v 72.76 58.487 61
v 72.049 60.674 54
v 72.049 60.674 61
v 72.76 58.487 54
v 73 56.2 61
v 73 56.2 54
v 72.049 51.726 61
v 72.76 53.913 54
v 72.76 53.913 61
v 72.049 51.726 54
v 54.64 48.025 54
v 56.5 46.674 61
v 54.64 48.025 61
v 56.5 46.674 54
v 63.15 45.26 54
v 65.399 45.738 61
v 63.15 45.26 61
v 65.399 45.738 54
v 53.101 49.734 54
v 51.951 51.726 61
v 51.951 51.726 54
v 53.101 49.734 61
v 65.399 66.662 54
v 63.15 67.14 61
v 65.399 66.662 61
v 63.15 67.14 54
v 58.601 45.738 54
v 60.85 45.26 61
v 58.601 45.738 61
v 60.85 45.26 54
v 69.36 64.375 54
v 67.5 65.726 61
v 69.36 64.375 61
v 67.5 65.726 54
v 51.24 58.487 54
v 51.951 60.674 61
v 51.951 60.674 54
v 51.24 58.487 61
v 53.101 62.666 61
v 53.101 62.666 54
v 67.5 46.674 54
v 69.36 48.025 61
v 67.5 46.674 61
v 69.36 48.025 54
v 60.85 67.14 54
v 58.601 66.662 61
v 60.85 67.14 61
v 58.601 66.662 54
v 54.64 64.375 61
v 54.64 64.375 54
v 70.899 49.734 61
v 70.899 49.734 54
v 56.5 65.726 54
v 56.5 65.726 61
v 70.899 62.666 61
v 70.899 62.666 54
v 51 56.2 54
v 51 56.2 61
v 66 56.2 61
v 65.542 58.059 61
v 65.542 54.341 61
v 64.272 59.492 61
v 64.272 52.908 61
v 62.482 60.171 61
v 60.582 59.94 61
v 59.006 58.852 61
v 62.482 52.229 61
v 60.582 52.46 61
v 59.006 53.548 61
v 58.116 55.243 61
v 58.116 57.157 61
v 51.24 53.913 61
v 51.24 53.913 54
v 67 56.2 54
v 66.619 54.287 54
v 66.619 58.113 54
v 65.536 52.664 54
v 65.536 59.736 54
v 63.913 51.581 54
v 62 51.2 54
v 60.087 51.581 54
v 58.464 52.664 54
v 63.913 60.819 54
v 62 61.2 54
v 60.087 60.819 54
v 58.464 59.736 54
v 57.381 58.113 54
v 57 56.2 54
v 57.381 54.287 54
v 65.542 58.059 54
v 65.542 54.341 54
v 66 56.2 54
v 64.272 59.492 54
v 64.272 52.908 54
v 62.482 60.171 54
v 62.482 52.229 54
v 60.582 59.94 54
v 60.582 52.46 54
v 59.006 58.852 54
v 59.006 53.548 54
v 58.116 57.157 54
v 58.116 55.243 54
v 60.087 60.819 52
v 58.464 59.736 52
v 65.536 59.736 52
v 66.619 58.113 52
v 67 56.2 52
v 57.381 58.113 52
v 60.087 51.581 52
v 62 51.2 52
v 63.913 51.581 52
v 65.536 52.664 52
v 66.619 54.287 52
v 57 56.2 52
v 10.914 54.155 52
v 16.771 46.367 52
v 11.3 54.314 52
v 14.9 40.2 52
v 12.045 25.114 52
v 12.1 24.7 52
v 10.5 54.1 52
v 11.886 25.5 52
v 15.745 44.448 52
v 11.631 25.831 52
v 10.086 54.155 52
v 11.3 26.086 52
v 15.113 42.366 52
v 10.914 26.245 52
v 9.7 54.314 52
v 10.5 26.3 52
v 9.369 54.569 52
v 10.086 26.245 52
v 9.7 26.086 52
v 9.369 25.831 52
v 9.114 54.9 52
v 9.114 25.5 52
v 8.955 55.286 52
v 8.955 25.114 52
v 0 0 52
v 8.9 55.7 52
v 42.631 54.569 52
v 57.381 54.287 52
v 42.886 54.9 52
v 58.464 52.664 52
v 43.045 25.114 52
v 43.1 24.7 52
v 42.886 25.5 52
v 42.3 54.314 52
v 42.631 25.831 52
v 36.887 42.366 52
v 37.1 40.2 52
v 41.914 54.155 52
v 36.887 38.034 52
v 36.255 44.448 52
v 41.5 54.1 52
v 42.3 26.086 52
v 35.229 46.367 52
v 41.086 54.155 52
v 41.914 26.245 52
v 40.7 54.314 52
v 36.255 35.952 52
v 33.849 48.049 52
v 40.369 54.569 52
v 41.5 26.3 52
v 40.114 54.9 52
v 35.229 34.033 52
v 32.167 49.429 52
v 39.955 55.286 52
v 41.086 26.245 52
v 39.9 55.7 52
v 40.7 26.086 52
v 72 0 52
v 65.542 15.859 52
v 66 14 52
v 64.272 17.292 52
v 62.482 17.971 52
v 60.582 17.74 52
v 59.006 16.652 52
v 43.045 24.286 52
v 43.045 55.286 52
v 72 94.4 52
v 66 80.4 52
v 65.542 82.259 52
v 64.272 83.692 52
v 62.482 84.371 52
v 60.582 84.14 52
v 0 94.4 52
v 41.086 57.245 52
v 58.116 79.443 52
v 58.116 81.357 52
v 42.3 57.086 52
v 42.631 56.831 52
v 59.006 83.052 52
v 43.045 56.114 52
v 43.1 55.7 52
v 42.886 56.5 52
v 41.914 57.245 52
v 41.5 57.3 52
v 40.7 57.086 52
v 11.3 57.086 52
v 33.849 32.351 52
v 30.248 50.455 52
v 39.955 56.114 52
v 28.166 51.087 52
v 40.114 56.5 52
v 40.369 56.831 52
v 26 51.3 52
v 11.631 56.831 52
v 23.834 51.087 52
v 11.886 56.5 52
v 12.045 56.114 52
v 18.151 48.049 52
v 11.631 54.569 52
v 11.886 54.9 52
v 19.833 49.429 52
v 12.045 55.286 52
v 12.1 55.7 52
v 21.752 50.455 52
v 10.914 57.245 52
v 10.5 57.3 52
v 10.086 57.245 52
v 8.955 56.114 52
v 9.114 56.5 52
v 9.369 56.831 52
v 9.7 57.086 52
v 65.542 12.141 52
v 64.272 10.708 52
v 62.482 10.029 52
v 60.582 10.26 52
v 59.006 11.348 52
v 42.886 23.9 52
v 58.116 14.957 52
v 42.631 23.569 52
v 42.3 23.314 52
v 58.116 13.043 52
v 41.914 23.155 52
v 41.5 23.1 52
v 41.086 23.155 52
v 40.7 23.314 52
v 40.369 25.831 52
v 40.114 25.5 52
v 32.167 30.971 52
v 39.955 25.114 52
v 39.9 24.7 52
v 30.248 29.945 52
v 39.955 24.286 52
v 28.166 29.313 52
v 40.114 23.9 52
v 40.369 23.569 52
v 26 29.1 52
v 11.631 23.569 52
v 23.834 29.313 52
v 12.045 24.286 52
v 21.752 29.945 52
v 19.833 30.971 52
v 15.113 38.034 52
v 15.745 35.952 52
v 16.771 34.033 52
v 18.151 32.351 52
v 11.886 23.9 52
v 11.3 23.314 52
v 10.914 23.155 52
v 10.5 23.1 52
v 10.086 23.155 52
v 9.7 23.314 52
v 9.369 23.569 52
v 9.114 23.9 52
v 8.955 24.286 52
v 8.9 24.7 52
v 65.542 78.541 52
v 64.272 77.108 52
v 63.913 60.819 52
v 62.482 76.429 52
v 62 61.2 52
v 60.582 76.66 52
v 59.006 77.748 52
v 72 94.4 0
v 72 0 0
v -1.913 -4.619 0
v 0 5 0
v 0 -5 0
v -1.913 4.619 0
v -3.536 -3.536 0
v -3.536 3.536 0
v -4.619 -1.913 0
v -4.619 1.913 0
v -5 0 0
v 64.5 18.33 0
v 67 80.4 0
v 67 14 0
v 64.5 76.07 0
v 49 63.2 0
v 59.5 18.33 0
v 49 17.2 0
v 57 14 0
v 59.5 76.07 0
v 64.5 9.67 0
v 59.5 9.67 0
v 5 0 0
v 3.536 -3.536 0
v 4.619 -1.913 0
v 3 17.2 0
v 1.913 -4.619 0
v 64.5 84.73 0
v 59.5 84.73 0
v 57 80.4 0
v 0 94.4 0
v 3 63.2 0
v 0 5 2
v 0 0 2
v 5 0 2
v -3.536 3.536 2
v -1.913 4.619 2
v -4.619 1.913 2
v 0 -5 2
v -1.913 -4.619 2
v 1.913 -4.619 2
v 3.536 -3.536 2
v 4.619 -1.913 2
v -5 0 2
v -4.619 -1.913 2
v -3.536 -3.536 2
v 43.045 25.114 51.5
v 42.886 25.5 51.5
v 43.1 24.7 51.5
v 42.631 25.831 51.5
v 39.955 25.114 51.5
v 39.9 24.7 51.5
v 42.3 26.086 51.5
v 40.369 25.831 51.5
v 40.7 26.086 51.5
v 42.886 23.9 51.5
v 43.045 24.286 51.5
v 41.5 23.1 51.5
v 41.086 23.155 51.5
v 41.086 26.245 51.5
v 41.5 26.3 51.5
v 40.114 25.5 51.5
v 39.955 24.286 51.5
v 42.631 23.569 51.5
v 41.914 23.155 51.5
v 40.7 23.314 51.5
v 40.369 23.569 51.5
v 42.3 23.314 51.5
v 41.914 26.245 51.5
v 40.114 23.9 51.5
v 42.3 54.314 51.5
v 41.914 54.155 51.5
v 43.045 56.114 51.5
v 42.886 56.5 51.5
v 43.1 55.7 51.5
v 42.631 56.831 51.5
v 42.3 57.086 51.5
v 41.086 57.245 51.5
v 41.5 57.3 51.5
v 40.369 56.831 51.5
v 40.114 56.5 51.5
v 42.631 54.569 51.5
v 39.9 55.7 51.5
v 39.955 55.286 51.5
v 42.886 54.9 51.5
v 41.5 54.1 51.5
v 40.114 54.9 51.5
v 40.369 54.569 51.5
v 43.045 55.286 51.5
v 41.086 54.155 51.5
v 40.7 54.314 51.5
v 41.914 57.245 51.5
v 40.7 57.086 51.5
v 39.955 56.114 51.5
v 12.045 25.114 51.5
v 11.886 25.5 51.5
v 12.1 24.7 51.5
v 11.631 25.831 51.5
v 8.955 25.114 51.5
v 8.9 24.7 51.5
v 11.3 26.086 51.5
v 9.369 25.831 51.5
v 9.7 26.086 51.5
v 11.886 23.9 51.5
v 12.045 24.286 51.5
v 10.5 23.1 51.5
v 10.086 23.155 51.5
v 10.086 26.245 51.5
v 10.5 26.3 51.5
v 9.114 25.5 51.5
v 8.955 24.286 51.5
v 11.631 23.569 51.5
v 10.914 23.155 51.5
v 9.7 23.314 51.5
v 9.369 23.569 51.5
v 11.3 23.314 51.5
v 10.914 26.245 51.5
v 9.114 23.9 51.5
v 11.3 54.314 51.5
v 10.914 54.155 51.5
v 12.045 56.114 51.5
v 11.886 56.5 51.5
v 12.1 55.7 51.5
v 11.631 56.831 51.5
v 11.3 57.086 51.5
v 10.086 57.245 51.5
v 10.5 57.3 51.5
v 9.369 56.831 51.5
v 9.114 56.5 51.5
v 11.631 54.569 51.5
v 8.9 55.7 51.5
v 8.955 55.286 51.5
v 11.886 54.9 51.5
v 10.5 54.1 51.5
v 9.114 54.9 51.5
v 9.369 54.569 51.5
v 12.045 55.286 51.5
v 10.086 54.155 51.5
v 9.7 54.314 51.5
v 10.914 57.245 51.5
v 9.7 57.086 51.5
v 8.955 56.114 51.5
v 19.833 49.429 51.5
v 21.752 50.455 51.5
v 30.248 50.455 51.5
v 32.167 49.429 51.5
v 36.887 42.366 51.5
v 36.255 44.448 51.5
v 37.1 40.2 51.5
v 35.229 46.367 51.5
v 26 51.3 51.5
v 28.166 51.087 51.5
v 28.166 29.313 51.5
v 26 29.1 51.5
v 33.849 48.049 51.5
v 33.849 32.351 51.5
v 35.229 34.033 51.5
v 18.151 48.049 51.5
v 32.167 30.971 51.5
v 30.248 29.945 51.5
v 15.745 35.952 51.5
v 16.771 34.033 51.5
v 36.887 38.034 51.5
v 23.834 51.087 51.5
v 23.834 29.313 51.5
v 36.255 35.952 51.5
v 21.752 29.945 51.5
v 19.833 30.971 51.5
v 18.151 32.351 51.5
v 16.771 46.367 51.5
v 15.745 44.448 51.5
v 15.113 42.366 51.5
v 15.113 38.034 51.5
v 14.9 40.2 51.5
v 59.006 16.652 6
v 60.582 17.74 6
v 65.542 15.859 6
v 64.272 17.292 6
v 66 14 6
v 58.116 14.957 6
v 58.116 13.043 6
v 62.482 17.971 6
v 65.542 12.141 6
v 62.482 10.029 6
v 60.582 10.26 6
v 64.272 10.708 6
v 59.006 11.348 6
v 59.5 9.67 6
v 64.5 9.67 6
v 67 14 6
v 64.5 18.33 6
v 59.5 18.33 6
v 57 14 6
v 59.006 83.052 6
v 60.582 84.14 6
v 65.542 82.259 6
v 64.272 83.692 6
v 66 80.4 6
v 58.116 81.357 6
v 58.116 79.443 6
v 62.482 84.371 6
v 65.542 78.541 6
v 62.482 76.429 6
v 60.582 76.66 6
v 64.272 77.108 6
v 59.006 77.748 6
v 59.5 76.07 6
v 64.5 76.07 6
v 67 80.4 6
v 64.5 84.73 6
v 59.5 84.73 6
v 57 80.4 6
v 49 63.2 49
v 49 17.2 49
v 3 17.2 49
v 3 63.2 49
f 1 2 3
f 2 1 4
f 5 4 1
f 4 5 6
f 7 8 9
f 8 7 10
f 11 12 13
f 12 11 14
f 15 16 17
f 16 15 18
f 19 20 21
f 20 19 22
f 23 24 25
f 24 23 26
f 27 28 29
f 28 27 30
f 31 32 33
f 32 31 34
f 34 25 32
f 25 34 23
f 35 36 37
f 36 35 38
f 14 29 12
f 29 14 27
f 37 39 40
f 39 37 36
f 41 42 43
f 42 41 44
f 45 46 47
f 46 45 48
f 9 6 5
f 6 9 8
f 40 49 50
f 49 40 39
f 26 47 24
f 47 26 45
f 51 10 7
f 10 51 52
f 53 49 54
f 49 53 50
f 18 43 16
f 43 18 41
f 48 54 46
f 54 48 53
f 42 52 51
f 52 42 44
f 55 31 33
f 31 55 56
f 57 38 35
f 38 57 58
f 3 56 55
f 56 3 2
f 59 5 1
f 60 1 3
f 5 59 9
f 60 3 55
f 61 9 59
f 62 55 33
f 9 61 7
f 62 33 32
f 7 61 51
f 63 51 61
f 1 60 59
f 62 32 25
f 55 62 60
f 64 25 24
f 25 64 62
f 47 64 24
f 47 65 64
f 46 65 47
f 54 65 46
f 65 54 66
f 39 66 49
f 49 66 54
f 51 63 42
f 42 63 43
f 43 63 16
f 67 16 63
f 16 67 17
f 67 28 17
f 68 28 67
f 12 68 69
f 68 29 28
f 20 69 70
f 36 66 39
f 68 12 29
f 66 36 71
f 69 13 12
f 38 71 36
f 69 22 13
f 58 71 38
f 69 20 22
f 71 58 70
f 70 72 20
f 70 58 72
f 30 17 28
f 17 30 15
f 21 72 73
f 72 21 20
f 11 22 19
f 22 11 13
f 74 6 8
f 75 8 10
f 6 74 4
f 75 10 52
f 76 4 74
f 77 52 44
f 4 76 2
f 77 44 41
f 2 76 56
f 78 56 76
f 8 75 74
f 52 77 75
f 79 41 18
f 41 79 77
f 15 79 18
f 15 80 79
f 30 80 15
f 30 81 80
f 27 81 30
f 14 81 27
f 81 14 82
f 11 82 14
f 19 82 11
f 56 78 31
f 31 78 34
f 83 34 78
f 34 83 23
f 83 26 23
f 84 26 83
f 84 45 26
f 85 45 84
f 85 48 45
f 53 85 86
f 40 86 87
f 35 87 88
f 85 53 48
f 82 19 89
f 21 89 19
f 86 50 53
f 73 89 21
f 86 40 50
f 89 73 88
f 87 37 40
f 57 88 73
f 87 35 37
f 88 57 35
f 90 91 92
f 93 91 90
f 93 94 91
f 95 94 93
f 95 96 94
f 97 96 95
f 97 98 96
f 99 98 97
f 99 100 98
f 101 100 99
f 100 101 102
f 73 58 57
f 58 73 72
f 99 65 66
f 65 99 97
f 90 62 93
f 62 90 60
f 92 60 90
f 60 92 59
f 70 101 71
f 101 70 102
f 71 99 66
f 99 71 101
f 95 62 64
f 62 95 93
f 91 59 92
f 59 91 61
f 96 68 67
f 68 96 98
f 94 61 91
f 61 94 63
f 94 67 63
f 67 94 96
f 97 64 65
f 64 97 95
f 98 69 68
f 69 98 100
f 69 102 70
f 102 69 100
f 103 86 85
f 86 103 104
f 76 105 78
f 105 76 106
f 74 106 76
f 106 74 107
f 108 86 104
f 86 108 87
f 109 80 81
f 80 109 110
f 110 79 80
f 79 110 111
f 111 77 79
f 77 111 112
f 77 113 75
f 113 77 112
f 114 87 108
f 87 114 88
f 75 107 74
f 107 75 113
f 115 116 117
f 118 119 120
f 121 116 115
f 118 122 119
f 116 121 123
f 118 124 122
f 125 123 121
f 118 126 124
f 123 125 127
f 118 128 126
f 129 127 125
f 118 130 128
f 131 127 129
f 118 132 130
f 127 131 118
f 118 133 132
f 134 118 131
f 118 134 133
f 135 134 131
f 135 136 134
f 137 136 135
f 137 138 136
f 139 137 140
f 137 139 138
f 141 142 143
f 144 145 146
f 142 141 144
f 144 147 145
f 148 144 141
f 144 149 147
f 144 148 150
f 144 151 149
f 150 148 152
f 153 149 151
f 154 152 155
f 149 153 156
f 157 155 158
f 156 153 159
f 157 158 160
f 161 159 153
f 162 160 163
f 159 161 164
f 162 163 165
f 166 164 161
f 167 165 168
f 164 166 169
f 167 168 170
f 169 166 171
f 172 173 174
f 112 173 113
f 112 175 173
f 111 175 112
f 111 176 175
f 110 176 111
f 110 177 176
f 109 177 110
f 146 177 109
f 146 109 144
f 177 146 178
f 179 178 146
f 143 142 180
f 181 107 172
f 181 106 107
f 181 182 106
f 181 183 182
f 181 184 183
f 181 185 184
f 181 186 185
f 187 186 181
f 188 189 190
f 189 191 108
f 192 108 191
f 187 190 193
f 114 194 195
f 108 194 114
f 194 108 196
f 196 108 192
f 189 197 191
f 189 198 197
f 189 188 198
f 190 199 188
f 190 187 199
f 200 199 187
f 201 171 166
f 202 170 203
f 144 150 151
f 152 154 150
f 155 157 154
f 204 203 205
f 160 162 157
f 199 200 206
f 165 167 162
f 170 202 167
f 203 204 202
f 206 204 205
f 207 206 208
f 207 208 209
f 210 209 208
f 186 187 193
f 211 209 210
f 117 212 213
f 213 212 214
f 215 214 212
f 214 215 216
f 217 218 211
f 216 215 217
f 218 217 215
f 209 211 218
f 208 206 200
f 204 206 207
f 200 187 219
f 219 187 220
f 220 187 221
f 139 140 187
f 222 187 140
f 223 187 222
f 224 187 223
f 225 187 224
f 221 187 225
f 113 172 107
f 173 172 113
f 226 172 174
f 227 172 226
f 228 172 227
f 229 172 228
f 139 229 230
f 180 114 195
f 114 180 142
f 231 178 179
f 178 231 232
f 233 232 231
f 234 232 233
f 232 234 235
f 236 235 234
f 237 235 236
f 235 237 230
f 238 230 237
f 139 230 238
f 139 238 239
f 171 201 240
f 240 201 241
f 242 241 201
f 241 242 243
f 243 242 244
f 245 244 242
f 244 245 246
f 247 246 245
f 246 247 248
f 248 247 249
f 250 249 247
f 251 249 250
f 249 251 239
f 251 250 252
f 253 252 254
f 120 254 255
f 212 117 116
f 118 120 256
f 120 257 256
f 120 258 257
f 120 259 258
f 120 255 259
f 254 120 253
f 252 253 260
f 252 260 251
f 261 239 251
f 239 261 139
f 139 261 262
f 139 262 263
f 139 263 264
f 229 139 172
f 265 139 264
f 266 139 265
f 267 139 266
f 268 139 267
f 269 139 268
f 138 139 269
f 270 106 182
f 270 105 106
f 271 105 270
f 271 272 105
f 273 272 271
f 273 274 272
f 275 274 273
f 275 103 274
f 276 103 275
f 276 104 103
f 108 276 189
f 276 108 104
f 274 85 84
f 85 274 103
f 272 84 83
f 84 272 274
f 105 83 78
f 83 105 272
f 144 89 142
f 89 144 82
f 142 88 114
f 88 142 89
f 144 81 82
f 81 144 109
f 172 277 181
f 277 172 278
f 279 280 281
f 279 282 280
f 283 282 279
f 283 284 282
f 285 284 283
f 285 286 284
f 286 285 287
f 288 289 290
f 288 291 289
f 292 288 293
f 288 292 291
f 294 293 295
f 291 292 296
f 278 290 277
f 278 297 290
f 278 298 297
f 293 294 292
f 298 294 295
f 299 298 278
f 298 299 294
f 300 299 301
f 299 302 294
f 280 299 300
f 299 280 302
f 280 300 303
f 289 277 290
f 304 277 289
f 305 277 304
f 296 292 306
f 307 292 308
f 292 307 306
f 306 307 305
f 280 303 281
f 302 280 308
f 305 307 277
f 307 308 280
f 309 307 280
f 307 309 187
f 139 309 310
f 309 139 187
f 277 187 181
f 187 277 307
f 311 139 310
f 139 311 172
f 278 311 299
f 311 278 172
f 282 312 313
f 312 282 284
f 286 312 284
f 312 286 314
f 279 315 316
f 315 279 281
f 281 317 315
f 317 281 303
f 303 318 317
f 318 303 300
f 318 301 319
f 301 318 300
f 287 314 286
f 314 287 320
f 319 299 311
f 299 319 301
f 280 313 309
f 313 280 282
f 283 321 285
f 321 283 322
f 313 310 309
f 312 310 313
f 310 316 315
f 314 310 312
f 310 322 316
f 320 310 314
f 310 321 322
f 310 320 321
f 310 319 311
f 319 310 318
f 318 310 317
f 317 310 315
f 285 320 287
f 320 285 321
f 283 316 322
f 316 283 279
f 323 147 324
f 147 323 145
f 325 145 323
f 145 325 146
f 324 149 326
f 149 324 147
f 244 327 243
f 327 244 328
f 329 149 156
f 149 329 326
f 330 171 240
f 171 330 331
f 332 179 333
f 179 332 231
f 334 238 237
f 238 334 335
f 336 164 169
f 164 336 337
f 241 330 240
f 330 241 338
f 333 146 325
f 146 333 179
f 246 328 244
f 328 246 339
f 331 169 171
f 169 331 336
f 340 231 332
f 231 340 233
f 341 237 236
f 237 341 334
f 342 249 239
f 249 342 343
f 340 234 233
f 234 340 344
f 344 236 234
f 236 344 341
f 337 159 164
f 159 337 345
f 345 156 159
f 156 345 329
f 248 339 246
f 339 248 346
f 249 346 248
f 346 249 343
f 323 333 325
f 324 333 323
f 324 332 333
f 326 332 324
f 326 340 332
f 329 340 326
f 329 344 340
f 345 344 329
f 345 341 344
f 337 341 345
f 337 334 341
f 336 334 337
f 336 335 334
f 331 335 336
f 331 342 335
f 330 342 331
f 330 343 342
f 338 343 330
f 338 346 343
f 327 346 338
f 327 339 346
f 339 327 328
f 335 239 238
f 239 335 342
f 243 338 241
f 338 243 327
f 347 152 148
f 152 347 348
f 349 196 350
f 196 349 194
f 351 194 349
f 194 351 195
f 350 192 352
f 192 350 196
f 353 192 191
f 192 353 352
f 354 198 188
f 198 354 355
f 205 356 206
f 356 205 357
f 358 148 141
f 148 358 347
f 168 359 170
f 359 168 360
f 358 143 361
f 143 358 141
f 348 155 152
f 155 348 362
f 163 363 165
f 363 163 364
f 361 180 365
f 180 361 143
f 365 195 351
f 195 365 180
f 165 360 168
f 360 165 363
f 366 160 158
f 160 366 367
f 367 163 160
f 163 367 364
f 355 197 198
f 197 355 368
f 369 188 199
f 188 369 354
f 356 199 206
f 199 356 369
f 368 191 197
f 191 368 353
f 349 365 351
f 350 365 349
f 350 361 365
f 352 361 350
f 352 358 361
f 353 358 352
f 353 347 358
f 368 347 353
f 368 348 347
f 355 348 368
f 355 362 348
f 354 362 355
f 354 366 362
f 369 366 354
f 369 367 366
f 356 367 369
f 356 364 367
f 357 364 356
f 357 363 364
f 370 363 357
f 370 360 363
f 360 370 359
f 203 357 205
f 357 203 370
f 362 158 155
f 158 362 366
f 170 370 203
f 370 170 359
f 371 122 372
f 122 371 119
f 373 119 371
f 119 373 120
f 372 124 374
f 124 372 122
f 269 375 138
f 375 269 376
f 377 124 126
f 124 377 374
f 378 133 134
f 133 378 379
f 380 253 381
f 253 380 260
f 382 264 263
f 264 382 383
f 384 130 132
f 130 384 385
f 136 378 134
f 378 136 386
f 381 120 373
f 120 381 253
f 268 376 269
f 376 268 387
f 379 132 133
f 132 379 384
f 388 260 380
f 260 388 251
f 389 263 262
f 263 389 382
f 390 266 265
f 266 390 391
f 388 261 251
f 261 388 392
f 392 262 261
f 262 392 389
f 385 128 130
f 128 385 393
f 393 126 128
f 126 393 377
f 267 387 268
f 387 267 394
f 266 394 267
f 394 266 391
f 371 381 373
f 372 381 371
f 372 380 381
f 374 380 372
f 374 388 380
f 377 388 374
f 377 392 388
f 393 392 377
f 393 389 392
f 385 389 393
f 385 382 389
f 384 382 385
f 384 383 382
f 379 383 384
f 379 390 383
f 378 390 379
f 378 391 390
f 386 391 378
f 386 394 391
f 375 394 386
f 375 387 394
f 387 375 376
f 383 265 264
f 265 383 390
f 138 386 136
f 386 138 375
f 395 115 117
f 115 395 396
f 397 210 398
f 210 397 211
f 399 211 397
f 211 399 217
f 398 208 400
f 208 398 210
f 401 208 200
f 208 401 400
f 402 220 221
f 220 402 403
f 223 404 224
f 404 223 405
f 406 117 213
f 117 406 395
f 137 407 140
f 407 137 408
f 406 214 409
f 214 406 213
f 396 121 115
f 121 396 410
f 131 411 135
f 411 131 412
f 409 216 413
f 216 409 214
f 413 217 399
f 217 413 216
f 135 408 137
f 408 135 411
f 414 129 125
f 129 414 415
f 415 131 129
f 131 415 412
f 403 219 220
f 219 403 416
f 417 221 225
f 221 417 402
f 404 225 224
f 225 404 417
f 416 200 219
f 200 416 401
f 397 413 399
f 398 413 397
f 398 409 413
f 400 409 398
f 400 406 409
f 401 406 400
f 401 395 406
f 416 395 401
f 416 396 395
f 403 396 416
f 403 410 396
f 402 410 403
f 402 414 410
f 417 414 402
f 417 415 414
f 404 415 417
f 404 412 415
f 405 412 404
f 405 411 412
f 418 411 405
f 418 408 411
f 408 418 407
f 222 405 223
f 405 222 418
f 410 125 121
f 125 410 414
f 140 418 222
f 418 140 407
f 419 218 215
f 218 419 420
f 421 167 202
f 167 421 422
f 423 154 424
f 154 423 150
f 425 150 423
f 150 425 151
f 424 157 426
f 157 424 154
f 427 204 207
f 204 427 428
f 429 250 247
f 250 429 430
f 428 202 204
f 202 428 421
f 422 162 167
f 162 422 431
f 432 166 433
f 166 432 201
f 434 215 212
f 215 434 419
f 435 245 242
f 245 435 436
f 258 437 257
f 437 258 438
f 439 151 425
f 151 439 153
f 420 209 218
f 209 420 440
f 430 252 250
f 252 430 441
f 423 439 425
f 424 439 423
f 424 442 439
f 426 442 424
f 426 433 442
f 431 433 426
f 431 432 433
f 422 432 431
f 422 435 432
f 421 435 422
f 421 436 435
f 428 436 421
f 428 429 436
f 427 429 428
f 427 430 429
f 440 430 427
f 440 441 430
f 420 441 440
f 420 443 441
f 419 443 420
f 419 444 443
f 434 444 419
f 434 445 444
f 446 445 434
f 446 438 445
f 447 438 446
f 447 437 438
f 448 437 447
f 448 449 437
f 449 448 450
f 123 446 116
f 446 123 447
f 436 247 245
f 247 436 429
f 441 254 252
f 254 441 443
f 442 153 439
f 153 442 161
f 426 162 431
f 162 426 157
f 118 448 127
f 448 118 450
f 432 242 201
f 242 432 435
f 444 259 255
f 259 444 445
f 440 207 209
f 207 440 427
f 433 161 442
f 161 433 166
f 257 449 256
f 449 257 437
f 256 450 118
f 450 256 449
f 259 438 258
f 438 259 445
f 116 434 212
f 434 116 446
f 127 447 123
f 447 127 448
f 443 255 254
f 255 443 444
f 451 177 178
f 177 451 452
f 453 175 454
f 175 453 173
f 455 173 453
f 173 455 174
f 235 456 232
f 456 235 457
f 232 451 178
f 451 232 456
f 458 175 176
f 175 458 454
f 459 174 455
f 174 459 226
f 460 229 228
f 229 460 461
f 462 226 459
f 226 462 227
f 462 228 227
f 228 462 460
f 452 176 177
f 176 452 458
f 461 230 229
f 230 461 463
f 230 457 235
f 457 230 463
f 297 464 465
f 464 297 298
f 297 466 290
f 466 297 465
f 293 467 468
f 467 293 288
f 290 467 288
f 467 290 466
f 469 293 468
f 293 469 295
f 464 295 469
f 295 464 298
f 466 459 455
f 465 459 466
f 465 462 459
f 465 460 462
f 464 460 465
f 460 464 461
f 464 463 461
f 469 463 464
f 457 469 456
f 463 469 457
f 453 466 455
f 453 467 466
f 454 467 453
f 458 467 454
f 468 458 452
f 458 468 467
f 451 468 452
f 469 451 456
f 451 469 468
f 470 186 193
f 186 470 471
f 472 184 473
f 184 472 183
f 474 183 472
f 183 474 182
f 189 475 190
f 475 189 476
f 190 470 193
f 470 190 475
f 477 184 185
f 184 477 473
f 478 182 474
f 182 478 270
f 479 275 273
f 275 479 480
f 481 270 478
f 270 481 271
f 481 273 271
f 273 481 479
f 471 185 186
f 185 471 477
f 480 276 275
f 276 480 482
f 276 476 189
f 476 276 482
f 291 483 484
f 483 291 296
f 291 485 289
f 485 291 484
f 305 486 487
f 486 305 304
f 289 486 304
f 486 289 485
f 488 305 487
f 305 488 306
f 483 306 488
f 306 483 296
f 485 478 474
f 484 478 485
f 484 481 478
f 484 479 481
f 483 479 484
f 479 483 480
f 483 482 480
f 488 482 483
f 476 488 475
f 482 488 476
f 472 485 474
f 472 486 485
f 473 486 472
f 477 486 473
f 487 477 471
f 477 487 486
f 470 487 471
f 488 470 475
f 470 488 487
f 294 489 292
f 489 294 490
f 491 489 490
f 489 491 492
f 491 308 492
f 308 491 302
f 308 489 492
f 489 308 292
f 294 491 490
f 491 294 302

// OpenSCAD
// file: lib/nema17_bolt_pattern.scad
//hole_z = 4;
//nema17_holes(hole_z);

module nema17_holes(hole_z){
  mounting_xy = 15.5;

  translate([0,0,hole_z/2]){
    cylinder(r=11.1, h=hole_z, center=true, $fn=32);
    translate([mounting_xy, 0,0]){
      translate([0,-mounting_xy,0]) cylinder(r=1.6,h=hole_z,center=true, $fn=24);
      translate([0,mounting_xy,0]) cylinder(r=1.6,h=hole_z,center=true, $fn=24);
    }
    translate([-mounting_xy,0,0]){
      translate([0,-mounting_xy,0]) cylinder(r=1.6,h=hole_z,center=true, $fn=24);
      translate([0, mounting_xy,0]) cylinder(r=1.6,h=hole_z,center=true, $fn=24);
    }
  }
}
// file: lib/config.scad
rod_r = 9.2/2;
screw_r = 3.2/2;

bearing_outer_r = 11;
bearing_inner_r = 4;
bearing_h = 7;


thin_wall_width = 3;
rod_wall_width = rod_r * 2 + 8;
frame_bolt_width = 15;

z_wall_width = 14;

nema_z = 47 + 2;
nema_xy = 42 + 4;
nema_center_x = rod_wall_width + frame_bolt_width + nema_xy/2;
nema_center_y = rod_wall_width + nema_xy/2;

z_rod_center_x = nema_center_x + 10;
z_rod_center_y = nema_center_y + 15.5 + 16;

nema_screw_xy_from_center = 15;
nema_shaft_r = 2.5;

frame_bolt_width = 15;

//ybox
tension_screw_r = 4;
tension_screw_bolt_r = 5;
tension_screw_bolt_h = 6;
tensioner_lip = 2;

z_box_x = rod_wall_width + frame_bolt_width + nema_xy;
z_box_y = rod_wall_width + nema_xy + z_wall_width + rod_wall_width;
z_box_z = nema_z + thin_wall_width;



rod_x_1_height = rod_r + z_box_z/5;
rod_x_2_height = rod_r + (z_box_z/5) *3;
rod_y_1_height = rod_r + (z_box_z/5) * 2;
// main file
include <lib/config.scad>
include <lib/nema17_bolt_pattern.scad>

full_render = true;

y_box();

module y_box(){
  y_tensioner_width = 20;
  y_box_x = thin_wall_width + nema_z + y_tensioner_width;

  tension_1_screw_center = [y_box_x - y_tensioner_width / 2, rod_wall_width + nema_xy/2 + bearing_outer_r + 5, z_box_z];
  tension_2_screw_center = [y_box_x - y_tensioner_width / 2,rod_wall_width + nema_xy/2 - bearing_outer_r - 5, z_box_z];

  difference(){
    union(){
      cube([y_box_x, z_box_y, z_box_z]);
      translate(tension_1_screw_center){
        cylinder(r = tension_screw_bolt_r, h = tensioner_lip);

        if(full_render){
          translate([0,0,tensioner_lip]) bearing();
        }
      }

      translate(tension_2_screw_center);
        cylinder(r = tension_screw_bolt_r, h = tensioner_lip);

    }
    translate([thin_wall_width, rod_wall_width, 0])
      cube([nema_xy, nema_xy, z_box_z - thin_wall_width]);

    translate([thin_wall_width + nema_xy/2,rod_wall_width + nema_xy/2, z_box_z]) nema17_holes();

    //tension_screws
    translate([y_box_x - y_tensioner_width / 2, 14, 0]){
      cylinder(r = tension_screw_r, h = z_box_z + tensioner_lip);
      cylinder(r = tension_screw_bolt_r, h = tension_screw_bolt_h, $fn=6);
    }

    translate([y_box_x - y_tensioner_width / 2, z_box_y - 14, 0]){
      cylinder(r = tension_screw_r, h = z_box_z + tensioner_lip);
      cylinder(r = tension_screw_bolt_r, h = tension_screw_bolt_h, $fn=6);
    }
  }
}

module bearing(){
  color("blue"){
    difference(){
      cylinder(r = bearing_outer_r, h=bearing_h);
      cylinder(r = bearing_inner_r, h=bearing_h);
    }  
  }
}
